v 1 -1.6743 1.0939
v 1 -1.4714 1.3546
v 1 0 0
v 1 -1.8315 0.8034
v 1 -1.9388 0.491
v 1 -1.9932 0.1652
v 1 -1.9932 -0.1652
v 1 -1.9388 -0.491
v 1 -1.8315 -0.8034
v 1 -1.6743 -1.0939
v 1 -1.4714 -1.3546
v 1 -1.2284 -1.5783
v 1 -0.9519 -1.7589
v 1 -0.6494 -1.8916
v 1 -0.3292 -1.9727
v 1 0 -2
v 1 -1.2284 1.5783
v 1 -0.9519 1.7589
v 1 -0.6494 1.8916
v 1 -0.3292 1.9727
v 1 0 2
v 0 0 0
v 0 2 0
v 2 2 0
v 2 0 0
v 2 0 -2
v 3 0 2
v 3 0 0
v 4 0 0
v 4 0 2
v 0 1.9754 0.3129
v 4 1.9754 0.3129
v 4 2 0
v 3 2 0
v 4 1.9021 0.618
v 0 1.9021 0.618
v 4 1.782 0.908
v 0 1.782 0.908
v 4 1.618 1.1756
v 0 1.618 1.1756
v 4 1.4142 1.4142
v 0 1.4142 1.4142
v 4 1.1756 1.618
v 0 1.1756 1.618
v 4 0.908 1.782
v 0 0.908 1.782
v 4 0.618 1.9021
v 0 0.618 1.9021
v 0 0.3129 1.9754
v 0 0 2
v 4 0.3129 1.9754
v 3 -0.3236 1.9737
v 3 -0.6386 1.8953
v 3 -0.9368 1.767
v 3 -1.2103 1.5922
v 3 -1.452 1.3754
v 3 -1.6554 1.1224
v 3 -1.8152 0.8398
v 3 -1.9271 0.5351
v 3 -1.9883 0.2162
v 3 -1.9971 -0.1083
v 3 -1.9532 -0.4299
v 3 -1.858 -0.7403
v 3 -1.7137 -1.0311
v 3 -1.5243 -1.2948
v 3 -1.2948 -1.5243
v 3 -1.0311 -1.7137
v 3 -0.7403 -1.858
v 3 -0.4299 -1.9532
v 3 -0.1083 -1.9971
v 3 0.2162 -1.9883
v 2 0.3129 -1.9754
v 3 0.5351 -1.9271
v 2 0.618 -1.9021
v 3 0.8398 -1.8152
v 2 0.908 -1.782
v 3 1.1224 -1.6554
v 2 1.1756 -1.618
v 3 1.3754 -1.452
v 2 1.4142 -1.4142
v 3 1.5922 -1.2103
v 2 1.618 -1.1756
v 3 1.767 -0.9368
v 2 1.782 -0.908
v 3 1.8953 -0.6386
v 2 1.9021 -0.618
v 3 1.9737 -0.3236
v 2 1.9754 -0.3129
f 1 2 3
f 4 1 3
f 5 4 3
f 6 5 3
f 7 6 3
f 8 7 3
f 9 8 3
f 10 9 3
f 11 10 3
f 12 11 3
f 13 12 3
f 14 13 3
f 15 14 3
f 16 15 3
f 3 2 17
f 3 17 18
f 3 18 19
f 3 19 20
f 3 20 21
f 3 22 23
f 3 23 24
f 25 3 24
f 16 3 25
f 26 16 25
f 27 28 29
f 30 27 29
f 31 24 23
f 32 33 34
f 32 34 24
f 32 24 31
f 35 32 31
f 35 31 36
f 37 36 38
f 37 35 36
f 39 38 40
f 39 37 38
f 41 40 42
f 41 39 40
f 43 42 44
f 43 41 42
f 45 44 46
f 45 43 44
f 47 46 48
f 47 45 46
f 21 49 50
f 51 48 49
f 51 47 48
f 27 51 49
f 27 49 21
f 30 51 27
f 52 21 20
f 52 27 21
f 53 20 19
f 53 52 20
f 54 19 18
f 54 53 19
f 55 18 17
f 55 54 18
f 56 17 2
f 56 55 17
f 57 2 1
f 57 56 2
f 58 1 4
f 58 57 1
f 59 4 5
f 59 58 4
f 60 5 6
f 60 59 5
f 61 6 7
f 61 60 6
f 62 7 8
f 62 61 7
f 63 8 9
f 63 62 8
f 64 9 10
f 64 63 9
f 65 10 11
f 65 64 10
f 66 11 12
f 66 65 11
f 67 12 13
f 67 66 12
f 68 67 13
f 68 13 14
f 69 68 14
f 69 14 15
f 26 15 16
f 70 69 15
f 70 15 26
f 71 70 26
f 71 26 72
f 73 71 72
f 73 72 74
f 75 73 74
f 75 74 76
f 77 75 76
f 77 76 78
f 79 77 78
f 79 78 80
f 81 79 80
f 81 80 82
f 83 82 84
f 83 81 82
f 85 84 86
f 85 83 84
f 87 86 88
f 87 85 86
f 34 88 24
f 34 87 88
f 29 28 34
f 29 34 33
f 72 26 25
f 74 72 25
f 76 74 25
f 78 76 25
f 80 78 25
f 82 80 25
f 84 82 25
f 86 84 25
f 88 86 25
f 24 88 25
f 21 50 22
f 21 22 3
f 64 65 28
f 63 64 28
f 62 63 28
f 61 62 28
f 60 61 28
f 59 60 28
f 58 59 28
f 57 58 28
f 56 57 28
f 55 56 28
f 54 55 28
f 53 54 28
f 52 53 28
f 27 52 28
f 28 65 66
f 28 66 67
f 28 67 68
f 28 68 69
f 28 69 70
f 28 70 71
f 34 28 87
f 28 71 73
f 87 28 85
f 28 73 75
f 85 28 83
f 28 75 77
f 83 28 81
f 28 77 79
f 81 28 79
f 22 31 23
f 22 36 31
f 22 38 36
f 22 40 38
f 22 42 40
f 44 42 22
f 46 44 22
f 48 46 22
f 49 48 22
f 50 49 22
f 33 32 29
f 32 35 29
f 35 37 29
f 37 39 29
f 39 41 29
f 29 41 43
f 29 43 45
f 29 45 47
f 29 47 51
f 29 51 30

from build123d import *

# Parameters (mm, degrees)
SKETCH5_W          = 4
SKETCH5_H          = 2
SKETCH6_W          = 1
SKETCH6_H          = 2
CUT_EXTRUDE5_DEPTH = 5.5
SKETCH7_W          = 2
SKETCH7_H          = 2
SKETCH7_W_2        = 1
CUT_EXTRUDE6_DEPTH = 10


with BuildPart() as part:
    # Sketch5 → Revolve-Thin2 (revolve)
    with BuildSketch(Plane.XY):
        with Locations((2, 1)):
            Rectangle(SKETCH5_W, SKETCH5_H)
    revolve(axis=Axis((0, 0, 0), (1, 0, 0)))

    # Sketch6 → Cut-Extrude5 (cut, symmetric)
    with BuildSketch(Plane.XY):
        with Locations((3.5, -1)):
            Rectangle(SKETCH6_W, SKETCH6_H)
        with Locations((0.5, -1)):
            Rectangle(SKETCH6_W, SKETCH6_H)
    extrude(amount=CUT_EXTRUDE5_DEPTH, both=True, mode=Mode.SUBTRACT)

    # Sketch7 → Cut-Extrude6 (cut)
    with BuildSketch(Plane.XZ):
        with Locations((1, -1)):
            Rectangle(SKETCH7_W, SKETCH7_H)
        with Locations((3.5, -1)):
            Rectangle(SKETCH7_W_2, SKETCH7_H)
    extrude(amount=-CUT_EXTRUDE6_DEPTH, mode=Mode.SUBTRACT)


solid = part.part
